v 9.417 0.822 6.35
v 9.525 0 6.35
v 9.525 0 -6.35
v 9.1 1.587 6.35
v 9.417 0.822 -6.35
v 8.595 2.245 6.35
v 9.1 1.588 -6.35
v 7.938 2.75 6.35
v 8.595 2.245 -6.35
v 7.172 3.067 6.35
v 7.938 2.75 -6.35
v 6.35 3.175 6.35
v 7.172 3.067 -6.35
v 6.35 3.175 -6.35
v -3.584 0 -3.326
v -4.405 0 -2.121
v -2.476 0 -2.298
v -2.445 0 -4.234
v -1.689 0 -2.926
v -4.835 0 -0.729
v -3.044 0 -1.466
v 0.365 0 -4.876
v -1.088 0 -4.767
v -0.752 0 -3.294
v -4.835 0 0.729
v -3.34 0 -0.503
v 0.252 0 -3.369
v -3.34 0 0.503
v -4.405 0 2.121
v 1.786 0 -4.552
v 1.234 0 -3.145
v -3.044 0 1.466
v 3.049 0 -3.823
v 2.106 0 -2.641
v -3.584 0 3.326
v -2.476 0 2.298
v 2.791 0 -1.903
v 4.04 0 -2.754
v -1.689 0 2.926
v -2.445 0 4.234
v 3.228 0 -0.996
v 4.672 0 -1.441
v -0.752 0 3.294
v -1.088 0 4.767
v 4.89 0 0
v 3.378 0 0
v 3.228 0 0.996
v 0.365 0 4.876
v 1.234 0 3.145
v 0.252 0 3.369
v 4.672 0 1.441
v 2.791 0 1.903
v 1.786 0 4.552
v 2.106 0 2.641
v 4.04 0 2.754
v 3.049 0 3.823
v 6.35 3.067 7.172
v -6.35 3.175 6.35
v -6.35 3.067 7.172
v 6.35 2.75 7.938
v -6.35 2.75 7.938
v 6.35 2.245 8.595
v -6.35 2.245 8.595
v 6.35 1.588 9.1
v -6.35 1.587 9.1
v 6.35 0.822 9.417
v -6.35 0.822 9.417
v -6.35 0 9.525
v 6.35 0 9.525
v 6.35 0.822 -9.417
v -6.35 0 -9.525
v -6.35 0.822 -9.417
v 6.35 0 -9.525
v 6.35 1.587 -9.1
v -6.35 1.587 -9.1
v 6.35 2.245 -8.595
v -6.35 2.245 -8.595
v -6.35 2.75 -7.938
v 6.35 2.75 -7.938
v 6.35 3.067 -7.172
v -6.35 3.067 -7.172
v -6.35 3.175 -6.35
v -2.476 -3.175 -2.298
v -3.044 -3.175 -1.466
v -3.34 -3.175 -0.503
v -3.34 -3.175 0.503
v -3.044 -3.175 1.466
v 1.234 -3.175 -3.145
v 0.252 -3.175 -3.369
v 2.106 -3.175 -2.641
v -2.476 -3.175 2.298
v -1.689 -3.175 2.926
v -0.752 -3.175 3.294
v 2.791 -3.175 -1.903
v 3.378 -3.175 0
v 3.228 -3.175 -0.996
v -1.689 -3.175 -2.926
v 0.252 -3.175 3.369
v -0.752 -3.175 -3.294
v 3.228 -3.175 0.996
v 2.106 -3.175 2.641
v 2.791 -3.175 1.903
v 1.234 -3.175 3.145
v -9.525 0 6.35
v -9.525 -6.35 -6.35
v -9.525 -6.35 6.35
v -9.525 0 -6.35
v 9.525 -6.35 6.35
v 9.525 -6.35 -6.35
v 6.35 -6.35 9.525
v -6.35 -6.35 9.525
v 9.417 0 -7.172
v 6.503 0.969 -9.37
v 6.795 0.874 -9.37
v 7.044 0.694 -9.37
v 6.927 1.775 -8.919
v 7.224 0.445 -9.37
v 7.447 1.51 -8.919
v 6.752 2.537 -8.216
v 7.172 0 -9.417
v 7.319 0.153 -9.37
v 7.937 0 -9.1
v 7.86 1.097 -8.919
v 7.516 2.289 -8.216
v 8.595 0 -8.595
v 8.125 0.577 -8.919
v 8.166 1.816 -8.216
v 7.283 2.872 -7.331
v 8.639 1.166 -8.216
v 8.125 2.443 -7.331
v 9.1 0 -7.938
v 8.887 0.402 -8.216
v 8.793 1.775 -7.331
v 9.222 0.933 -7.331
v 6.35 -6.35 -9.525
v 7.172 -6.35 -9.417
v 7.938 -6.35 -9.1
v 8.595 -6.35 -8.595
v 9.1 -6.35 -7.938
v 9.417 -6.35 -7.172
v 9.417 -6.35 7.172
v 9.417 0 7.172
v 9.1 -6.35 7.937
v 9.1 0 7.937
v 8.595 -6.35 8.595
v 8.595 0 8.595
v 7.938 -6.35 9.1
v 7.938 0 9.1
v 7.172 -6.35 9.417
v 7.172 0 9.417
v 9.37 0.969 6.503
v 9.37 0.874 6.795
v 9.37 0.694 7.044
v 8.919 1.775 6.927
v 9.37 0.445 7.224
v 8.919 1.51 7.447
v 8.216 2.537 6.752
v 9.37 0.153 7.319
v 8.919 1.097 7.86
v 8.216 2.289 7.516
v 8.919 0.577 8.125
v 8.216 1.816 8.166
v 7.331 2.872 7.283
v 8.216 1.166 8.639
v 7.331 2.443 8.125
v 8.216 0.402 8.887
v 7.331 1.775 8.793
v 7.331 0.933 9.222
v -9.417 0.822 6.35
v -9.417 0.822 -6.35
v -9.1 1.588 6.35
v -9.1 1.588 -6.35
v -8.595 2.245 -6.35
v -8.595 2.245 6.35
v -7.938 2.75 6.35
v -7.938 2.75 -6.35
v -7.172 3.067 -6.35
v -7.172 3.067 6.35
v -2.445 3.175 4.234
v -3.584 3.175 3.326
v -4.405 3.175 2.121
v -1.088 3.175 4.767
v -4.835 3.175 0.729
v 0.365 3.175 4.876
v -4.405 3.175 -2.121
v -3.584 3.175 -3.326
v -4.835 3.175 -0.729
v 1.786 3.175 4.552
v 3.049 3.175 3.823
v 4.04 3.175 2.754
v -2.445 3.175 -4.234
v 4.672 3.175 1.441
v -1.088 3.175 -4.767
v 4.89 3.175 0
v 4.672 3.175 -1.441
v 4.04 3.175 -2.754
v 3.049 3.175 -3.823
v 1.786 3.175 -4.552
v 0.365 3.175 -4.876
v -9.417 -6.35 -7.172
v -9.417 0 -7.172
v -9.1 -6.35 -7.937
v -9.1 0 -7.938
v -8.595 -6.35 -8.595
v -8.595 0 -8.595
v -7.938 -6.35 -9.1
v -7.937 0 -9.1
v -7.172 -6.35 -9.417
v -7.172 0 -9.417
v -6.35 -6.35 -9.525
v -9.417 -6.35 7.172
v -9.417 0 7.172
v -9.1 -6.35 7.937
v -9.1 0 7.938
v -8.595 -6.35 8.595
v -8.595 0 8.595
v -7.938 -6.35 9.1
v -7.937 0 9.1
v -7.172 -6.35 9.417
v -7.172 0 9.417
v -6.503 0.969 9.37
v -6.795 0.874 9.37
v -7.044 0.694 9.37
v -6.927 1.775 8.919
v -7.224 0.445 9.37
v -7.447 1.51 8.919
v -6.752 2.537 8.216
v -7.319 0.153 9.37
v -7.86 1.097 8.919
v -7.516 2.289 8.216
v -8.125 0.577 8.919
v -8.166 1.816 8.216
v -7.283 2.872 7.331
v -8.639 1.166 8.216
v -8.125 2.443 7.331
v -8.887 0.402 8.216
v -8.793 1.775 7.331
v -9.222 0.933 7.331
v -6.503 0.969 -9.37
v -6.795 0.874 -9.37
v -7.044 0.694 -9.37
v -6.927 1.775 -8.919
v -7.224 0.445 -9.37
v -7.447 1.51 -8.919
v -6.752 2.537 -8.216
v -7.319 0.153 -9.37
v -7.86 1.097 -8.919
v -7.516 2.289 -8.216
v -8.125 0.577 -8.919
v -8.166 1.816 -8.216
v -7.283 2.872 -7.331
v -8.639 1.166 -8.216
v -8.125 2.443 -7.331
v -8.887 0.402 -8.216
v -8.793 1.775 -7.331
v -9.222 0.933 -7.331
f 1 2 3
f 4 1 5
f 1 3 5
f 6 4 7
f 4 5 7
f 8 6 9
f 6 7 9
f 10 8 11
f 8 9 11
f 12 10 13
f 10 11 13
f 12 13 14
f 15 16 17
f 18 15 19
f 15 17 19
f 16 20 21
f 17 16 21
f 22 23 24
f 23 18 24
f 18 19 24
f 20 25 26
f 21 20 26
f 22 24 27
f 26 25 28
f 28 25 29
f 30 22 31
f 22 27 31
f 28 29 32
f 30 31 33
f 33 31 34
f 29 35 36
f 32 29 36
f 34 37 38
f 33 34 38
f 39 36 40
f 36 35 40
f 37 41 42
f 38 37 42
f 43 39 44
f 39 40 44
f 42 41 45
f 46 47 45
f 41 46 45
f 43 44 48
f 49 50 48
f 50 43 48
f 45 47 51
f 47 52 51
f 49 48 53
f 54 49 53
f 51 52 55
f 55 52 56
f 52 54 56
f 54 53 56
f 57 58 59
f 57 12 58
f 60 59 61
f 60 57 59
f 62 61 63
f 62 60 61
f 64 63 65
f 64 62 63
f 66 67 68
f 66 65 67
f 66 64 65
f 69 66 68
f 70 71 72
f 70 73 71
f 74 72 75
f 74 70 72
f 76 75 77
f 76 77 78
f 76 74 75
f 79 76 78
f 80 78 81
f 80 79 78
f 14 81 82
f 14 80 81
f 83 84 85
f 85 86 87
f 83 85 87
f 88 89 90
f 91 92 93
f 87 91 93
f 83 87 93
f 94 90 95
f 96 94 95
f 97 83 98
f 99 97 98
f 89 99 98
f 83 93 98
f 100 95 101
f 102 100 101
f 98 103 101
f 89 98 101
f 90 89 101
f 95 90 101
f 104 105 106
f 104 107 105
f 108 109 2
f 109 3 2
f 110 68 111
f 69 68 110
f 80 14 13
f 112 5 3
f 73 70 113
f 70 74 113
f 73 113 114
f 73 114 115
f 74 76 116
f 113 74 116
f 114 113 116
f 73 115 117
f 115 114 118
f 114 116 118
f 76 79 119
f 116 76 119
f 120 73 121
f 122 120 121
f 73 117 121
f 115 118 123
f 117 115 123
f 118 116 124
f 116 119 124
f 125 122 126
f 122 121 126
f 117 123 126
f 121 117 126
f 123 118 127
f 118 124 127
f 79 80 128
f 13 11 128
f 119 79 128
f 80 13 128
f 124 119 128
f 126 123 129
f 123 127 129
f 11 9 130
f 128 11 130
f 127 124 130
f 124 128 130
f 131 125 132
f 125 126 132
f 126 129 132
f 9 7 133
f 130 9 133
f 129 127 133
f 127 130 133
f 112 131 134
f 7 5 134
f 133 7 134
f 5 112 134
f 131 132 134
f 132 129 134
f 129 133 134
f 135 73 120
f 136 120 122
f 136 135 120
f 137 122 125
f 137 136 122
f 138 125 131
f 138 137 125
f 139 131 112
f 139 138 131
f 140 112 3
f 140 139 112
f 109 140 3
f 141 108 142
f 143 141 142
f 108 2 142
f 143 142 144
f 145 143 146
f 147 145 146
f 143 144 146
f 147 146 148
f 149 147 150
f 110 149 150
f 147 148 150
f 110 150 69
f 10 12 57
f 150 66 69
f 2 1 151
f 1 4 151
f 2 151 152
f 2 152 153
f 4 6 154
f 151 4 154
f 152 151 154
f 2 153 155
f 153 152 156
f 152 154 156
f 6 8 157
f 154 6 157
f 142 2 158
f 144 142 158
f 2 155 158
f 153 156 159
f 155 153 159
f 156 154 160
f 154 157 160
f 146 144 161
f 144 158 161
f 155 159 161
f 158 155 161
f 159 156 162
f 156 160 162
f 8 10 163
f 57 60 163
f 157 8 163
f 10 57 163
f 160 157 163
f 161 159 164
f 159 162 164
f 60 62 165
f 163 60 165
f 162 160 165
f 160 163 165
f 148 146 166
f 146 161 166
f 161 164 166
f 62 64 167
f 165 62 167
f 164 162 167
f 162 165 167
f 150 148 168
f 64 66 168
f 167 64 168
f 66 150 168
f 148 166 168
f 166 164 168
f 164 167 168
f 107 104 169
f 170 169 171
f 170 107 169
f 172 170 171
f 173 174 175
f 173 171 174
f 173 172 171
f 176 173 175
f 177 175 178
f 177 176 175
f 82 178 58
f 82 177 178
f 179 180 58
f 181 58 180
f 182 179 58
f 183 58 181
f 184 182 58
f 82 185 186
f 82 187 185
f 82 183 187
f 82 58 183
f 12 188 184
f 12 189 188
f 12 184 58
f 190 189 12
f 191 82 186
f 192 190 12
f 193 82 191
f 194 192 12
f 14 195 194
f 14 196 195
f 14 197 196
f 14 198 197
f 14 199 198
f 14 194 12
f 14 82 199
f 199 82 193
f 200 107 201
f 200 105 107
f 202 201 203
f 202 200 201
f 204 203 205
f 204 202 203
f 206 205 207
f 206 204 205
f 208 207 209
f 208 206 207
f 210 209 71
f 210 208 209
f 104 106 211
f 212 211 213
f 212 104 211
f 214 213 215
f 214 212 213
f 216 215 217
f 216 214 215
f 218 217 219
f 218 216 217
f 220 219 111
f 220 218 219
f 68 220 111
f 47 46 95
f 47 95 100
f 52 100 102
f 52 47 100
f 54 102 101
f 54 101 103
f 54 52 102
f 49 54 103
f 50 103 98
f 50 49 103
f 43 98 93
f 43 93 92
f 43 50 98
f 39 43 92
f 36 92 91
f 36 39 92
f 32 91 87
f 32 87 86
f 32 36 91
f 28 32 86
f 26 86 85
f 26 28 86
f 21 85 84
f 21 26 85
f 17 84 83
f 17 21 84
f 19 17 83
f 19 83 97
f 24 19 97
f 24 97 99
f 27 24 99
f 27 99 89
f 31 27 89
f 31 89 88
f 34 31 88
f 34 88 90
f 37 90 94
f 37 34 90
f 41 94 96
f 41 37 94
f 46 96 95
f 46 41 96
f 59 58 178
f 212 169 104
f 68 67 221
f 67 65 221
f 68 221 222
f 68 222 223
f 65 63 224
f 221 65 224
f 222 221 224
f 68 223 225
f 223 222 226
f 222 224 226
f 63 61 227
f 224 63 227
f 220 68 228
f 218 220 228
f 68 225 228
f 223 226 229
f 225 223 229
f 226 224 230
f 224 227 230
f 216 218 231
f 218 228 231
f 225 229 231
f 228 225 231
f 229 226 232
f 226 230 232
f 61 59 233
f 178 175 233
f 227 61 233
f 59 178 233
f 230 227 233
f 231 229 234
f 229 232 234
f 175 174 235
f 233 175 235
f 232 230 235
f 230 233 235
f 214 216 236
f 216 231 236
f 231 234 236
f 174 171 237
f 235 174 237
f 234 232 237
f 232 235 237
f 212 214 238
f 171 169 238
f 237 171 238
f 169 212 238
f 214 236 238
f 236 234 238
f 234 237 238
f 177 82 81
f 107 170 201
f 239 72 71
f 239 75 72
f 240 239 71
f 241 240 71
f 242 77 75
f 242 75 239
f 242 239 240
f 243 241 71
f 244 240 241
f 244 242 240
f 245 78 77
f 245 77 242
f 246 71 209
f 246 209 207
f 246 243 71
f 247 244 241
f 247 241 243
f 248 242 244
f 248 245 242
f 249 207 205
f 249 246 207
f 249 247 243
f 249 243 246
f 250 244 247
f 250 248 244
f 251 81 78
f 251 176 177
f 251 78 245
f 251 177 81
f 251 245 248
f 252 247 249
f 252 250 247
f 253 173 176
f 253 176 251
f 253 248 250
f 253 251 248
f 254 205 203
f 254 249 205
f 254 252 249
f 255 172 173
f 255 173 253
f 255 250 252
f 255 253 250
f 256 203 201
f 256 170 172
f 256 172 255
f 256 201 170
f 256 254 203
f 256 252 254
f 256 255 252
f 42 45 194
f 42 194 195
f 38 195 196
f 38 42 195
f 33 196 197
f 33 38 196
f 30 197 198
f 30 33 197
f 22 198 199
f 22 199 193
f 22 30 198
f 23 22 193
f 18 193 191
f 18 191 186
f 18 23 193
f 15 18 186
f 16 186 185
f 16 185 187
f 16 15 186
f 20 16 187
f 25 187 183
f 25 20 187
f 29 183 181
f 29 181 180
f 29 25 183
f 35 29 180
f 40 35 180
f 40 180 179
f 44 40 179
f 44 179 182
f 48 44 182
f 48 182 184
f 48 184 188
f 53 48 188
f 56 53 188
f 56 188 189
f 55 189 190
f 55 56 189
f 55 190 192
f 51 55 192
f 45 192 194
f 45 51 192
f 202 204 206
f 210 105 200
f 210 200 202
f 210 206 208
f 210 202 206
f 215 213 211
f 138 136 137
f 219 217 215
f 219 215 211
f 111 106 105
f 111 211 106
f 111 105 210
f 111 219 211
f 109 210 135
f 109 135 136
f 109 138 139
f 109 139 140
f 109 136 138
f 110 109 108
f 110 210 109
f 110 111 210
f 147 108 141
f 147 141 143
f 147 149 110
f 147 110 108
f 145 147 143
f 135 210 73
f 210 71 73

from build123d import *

# Parameters (mm, degrees)
SKETCH1_W           = 19.05
SKETCH1_H           = 19.05
SKETCH1_R           = 4.8895
BOSS_EXTRUDE1_DEPTH = 3.175
SKETCH3_W           = 19.05
SKETCH3_H           = 19.05
SKETCH3_R           = 3.3782
BOSS_EXTRUDE2_DEPTH = 3.175
SKETCH4_W           = 19.05
SKETCH4_H           = 19.05
BOSS_EXTRUDE3_DEPTH = 3.175
FILLET1_R           = 3.175


with BuildPart() as part:
    # Sketch1 → Boss-Extrude1 (new body)
    with BuildSketch(Plane(origin=(0, 0, 0), x_dir=(1, 0, 0), z_dir=(0, 1, 0))):
        Rectangle(SKETCH1_W, SKETCH1_H)
        Circle(SKETCH1_R, mode=Mode.SUBTRACT)
    extrude(amount=BOSS_EXTRUDE1_DEPTH)

    # Sketch3 → Boss-Extrude2 (add)
    with BuildSketch(Plane.XZ):
        Rectangle(SKETCH3_W, SKETCH3_H)
        Circle(SKETCH3_R, mode=Mode.SUBTRACT)
    extrude(amount=BOSS_EXTRUDE2_DEPTH)

    # Sketch4 → Boss-Extrude3 (add)
    with BuildSketch(Plane.XZ.offset(3.175)):
        Rectangle(SKETCH4_W, SKETCH4_H)
    extrude(amount=BOSS_EXTRUDE3_DEPTH)

    # Fillet1
    fillet1_edges = [part.edges().sort_by_distance(p)[0] for p in [
        (-9.525, 3.175, 0),
        (0, 3.175, 9.525),
        (9.525, 3.175, 0),
        (0, 3.175, -9.525),
        (9.525, -1.5875, 9.525),
        (-9.525, -1.5875, 9.525),
        (-9.525, -1.5875, -9.525),
        (9.525, -1.5875, -9.525),
    ]]
    fillet(fillet1_edges, radius=FILLET1_R)


solid = part.part
